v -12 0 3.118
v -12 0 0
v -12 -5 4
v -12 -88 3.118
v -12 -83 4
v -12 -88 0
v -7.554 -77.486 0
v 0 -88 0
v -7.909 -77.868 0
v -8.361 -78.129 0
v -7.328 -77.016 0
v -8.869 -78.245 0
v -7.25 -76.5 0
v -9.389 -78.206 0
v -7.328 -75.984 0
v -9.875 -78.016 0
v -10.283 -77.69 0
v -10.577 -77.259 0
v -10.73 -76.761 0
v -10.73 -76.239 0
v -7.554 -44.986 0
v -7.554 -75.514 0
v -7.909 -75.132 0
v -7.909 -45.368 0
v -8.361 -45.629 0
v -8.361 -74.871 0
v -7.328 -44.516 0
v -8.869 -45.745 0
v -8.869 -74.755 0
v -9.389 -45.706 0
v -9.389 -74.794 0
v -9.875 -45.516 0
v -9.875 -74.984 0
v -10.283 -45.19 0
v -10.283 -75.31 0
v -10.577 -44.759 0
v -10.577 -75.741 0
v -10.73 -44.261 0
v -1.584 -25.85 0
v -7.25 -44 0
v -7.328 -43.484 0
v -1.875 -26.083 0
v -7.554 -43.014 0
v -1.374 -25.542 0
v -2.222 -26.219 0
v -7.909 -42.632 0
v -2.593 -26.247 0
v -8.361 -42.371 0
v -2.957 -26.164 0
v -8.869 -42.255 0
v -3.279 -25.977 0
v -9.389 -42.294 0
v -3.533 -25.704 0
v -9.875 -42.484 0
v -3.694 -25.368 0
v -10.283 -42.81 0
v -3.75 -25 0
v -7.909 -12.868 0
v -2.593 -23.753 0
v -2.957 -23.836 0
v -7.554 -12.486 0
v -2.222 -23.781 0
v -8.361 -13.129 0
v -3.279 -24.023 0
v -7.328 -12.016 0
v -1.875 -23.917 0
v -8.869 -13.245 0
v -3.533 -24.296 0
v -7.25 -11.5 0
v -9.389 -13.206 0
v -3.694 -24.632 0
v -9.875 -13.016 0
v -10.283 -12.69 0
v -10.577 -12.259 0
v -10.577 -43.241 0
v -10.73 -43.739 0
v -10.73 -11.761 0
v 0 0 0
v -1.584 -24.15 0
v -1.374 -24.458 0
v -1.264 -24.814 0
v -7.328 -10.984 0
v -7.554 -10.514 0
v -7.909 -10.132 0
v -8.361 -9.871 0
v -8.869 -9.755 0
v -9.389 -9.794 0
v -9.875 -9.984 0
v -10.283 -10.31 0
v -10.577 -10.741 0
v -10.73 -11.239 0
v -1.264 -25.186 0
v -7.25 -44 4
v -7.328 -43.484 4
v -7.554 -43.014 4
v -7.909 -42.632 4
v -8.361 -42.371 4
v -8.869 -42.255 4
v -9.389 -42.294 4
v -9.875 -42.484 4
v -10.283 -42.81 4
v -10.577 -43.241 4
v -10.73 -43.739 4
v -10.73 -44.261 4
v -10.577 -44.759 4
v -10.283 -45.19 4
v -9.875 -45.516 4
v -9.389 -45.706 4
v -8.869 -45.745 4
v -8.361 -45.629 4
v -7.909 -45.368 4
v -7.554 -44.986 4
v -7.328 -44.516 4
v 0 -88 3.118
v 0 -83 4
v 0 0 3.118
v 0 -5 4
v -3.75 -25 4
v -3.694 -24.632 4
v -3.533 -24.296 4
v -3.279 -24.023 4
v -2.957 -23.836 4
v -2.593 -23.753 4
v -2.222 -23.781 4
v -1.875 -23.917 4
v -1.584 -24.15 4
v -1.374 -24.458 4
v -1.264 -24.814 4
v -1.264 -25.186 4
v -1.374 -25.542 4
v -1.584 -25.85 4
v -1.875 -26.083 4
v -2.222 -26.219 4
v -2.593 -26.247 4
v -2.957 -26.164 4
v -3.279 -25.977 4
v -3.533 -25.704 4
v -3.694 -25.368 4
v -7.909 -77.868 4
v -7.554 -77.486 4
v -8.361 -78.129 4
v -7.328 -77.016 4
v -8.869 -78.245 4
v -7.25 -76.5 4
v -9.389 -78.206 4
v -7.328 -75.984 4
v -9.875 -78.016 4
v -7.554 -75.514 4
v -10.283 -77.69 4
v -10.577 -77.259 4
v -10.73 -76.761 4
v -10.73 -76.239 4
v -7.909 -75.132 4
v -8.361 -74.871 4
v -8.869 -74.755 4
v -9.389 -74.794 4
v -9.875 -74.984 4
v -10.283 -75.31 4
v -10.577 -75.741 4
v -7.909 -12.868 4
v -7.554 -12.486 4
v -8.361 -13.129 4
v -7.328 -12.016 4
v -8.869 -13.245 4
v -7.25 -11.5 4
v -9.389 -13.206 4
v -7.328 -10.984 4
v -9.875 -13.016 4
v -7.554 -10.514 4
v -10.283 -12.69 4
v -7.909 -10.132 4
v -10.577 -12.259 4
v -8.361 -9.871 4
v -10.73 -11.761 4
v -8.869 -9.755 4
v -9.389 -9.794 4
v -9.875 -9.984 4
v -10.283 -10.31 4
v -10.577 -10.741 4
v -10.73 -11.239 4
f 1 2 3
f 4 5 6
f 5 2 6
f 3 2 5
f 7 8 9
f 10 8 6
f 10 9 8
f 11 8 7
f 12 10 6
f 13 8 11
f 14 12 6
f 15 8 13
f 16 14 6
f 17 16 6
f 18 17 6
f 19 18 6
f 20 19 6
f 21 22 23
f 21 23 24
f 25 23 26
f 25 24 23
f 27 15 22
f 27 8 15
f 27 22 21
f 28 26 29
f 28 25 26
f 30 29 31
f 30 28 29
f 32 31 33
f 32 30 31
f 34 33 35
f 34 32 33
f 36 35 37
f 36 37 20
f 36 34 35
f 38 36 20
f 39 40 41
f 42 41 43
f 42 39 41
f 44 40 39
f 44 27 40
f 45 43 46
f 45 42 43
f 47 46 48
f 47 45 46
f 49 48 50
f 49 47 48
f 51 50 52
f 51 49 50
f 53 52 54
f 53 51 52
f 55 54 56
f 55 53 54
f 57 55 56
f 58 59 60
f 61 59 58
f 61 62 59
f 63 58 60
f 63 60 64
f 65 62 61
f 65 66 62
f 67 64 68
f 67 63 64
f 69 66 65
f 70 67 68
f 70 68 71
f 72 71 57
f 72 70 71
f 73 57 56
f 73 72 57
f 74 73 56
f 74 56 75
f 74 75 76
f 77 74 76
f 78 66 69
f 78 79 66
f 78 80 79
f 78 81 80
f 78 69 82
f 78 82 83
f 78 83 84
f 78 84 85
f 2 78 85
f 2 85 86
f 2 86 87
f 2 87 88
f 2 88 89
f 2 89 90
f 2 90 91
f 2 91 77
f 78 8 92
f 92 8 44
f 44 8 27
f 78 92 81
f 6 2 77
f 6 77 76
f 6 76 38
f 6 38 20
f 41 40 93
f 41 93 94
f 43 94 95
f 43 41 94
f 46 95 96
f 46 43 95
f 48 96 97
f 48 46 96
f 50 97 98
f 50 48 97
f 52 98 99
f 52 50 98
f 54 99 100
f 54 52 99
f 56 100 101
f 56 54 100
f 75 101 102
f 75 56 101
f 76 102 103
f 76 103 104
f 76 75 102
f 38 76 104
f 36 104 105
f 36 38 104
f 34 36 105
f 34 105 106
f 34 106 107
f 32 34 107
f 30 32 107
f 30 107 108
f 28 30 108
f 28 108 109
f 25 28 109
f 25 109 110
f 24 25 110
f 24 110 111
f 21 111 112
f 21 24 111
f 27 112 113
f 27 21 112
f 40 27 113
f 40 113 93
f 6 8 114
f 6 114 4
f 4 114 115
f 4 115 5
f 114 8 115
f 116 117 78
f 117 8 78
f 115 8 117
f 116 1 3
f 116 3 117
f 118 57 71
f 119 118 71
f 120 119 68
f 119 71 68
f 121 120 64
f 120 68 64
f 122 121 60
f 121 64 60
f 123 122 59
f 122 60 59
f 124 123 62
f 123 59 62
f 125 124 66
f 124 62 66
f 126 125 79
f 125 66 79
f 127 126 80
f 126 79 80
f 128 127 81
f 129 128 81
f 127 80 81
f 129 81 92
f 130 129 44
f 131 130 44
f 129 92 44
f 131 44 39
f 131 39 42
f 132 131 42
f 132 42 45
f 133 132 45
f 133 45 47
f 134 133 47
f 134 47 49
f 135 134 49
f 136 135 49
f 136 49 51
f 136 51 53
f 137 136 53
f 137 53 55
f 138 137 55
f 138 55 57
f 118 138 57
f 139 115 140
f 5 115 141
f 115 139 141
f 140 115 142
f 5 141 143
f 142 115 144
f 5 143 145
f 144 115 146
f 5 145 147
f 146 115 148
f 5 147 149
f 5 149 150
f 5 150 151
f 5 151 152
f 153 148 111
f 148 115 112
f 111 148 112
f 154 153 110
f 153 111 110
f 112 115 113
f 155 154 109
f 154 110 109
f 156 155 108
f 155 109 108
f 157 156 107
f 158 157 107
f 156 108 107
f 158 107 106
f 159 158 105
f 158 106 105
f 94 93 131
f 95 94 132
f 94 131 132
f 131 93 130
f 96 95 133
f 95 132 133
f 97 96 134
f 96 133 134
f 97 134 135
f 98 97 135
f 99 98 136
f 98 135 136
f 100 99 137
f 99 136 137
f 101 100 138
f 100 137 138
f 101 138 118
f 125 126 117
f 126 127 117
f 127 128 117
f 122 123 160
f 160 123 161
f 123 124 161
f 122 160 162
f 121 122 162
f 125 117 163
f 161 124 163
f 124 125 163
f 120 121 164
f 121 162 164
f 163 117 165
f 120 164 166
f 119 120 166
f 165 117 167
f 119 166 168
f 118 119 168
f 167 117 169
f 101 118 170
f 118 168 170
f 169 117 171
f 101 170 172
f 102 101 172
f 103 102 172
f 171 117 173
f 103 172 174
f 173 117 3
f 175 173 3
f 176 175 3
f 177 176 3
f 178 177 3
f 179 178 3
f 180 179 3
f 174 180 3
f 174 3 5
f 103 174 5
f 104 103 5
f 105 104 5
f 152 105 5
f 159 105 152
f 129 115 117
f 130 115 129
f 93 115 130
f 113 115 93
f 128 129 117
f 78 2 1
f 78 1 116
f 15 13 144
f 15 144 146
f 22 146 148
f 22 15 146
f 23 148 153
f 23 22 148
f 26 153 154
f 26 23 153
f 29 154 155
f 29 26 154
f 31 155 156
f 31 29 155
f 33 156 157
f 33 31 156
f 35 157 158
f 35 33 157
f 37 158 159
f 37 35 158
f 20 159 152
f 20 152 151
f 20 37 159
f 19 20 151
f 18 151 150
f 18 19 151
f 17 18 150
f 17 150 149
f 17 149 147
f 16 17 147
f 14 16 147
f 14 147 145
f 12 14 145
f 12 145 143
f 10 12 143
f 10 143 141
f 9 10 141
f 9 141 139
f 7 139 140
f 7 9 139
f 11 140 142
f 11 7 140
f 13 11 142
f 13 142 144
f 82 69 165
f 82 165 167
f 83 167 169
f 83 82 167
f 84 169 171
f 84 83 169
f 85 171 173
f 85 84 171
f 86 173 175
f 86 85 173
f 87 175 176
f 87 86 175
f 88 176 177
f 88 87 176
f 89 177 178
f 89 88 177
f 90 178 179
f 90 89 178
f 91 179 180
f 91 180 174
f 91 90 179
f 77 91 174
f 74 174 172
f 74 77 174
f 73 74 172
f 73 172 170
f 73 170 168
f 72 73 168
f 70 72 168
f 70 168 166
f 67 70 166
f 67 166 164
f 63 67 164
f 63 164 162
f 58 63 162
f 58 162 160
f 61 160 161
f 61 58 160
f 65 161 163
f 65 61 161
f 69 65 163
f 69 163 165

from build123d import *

# Parameters (mm, degrees)
SKETCH_1_R             = 1.75
EXTRUDE_1_DEPTH        = 4
HOLE_WIZARD_M3_1_D     = 2.5
HOLE_WIZARD_M3_1_DEPTH = 9.5
HOLE_WIZARD_M3_1_TIP   = 0.751075774
CHAMFER_1_SIZE         = 5
CHAMFER_1_SIZE2        = 0.881634904
CHAMFER_2_SIZE         = 5
CHAMFER_2_SIZE2        = 0.881634904


with BuildPart() as part:
    # 草图1 → 凸台-拉伸1 (new body)
    with BuildSketch(Plane.XY):
        Polygon((-12, 0), (0, 0), (0, -5), (0, -83), (0, -88), (-12, -88), (-12, -83), (-12, -5), align=None)
        with Locations((-9, -76.5)):
            Circle(SKETCH_1_R, mode=Mode.SUBTRACT)
        with Locations((-9, -44)):
            Circle(SKETCH_1_R, mode=Mode.SUBTRACT)
        with Locations((-9, -11.5)):
            Circle(SKETCH_1_R, mode=Mode.SUBTRACT)
    extrude(amount=EXTRUDE_1_DEPTH)

    # M3 螺纹孔1
    with Locations(Plane.XY.offset(4)):
        with Locations((-2.5, -25)):
            Hole(HOLE_WIZARD_M3_1_D / 2, depth=HOLE_WIZARD_M3_1_DEPTH)
            with Locations((0, 0, -(HOLE_WIZARD_M3_1_DEPTH + HOLE_WIZARD_M3_1_TIP / 2))):  # 118° drill point
                Cone(0, HOLE_WIZARD_M3_1_D / 2, HOLE_WIZARD_M3_1_TIP, mode=Mode.SUBTRACT)

    # 倒角1
    chamfer_1_edges = [part.edges().sort_by_distance(p)[0] for p in [
        (-6, -88, 4),
    ]]
    chamfer_1_side = [part.faces().sort_by_distance(p)[0] for p in [
        (-5.932099717, -44.091238005, 4),
    ]]
    chamfer(chamfer_1_edges, length=CHAMFER_1_SIZE, length2=CHAMFER_1_SIZE2, reference=chamfer_1_side[0])

    # 倒角2
    chamfer_2_edges = [part.edges().sort_by_distance(p)[0] for p in [
        (-6, 0, 4),
    ]]
    chamfer_2_side = [part.faces().sort_by_distance(p)[0] for p in [
        (-5.927865775, -41.509182575, 4),
    ]]
    chamfer(chamfer_2_edges, length=CHAMFER_2_SIZE, length2=CHAMFER_2_SIZE2, reference=chamfer_2_side[0])


solid = part.part
